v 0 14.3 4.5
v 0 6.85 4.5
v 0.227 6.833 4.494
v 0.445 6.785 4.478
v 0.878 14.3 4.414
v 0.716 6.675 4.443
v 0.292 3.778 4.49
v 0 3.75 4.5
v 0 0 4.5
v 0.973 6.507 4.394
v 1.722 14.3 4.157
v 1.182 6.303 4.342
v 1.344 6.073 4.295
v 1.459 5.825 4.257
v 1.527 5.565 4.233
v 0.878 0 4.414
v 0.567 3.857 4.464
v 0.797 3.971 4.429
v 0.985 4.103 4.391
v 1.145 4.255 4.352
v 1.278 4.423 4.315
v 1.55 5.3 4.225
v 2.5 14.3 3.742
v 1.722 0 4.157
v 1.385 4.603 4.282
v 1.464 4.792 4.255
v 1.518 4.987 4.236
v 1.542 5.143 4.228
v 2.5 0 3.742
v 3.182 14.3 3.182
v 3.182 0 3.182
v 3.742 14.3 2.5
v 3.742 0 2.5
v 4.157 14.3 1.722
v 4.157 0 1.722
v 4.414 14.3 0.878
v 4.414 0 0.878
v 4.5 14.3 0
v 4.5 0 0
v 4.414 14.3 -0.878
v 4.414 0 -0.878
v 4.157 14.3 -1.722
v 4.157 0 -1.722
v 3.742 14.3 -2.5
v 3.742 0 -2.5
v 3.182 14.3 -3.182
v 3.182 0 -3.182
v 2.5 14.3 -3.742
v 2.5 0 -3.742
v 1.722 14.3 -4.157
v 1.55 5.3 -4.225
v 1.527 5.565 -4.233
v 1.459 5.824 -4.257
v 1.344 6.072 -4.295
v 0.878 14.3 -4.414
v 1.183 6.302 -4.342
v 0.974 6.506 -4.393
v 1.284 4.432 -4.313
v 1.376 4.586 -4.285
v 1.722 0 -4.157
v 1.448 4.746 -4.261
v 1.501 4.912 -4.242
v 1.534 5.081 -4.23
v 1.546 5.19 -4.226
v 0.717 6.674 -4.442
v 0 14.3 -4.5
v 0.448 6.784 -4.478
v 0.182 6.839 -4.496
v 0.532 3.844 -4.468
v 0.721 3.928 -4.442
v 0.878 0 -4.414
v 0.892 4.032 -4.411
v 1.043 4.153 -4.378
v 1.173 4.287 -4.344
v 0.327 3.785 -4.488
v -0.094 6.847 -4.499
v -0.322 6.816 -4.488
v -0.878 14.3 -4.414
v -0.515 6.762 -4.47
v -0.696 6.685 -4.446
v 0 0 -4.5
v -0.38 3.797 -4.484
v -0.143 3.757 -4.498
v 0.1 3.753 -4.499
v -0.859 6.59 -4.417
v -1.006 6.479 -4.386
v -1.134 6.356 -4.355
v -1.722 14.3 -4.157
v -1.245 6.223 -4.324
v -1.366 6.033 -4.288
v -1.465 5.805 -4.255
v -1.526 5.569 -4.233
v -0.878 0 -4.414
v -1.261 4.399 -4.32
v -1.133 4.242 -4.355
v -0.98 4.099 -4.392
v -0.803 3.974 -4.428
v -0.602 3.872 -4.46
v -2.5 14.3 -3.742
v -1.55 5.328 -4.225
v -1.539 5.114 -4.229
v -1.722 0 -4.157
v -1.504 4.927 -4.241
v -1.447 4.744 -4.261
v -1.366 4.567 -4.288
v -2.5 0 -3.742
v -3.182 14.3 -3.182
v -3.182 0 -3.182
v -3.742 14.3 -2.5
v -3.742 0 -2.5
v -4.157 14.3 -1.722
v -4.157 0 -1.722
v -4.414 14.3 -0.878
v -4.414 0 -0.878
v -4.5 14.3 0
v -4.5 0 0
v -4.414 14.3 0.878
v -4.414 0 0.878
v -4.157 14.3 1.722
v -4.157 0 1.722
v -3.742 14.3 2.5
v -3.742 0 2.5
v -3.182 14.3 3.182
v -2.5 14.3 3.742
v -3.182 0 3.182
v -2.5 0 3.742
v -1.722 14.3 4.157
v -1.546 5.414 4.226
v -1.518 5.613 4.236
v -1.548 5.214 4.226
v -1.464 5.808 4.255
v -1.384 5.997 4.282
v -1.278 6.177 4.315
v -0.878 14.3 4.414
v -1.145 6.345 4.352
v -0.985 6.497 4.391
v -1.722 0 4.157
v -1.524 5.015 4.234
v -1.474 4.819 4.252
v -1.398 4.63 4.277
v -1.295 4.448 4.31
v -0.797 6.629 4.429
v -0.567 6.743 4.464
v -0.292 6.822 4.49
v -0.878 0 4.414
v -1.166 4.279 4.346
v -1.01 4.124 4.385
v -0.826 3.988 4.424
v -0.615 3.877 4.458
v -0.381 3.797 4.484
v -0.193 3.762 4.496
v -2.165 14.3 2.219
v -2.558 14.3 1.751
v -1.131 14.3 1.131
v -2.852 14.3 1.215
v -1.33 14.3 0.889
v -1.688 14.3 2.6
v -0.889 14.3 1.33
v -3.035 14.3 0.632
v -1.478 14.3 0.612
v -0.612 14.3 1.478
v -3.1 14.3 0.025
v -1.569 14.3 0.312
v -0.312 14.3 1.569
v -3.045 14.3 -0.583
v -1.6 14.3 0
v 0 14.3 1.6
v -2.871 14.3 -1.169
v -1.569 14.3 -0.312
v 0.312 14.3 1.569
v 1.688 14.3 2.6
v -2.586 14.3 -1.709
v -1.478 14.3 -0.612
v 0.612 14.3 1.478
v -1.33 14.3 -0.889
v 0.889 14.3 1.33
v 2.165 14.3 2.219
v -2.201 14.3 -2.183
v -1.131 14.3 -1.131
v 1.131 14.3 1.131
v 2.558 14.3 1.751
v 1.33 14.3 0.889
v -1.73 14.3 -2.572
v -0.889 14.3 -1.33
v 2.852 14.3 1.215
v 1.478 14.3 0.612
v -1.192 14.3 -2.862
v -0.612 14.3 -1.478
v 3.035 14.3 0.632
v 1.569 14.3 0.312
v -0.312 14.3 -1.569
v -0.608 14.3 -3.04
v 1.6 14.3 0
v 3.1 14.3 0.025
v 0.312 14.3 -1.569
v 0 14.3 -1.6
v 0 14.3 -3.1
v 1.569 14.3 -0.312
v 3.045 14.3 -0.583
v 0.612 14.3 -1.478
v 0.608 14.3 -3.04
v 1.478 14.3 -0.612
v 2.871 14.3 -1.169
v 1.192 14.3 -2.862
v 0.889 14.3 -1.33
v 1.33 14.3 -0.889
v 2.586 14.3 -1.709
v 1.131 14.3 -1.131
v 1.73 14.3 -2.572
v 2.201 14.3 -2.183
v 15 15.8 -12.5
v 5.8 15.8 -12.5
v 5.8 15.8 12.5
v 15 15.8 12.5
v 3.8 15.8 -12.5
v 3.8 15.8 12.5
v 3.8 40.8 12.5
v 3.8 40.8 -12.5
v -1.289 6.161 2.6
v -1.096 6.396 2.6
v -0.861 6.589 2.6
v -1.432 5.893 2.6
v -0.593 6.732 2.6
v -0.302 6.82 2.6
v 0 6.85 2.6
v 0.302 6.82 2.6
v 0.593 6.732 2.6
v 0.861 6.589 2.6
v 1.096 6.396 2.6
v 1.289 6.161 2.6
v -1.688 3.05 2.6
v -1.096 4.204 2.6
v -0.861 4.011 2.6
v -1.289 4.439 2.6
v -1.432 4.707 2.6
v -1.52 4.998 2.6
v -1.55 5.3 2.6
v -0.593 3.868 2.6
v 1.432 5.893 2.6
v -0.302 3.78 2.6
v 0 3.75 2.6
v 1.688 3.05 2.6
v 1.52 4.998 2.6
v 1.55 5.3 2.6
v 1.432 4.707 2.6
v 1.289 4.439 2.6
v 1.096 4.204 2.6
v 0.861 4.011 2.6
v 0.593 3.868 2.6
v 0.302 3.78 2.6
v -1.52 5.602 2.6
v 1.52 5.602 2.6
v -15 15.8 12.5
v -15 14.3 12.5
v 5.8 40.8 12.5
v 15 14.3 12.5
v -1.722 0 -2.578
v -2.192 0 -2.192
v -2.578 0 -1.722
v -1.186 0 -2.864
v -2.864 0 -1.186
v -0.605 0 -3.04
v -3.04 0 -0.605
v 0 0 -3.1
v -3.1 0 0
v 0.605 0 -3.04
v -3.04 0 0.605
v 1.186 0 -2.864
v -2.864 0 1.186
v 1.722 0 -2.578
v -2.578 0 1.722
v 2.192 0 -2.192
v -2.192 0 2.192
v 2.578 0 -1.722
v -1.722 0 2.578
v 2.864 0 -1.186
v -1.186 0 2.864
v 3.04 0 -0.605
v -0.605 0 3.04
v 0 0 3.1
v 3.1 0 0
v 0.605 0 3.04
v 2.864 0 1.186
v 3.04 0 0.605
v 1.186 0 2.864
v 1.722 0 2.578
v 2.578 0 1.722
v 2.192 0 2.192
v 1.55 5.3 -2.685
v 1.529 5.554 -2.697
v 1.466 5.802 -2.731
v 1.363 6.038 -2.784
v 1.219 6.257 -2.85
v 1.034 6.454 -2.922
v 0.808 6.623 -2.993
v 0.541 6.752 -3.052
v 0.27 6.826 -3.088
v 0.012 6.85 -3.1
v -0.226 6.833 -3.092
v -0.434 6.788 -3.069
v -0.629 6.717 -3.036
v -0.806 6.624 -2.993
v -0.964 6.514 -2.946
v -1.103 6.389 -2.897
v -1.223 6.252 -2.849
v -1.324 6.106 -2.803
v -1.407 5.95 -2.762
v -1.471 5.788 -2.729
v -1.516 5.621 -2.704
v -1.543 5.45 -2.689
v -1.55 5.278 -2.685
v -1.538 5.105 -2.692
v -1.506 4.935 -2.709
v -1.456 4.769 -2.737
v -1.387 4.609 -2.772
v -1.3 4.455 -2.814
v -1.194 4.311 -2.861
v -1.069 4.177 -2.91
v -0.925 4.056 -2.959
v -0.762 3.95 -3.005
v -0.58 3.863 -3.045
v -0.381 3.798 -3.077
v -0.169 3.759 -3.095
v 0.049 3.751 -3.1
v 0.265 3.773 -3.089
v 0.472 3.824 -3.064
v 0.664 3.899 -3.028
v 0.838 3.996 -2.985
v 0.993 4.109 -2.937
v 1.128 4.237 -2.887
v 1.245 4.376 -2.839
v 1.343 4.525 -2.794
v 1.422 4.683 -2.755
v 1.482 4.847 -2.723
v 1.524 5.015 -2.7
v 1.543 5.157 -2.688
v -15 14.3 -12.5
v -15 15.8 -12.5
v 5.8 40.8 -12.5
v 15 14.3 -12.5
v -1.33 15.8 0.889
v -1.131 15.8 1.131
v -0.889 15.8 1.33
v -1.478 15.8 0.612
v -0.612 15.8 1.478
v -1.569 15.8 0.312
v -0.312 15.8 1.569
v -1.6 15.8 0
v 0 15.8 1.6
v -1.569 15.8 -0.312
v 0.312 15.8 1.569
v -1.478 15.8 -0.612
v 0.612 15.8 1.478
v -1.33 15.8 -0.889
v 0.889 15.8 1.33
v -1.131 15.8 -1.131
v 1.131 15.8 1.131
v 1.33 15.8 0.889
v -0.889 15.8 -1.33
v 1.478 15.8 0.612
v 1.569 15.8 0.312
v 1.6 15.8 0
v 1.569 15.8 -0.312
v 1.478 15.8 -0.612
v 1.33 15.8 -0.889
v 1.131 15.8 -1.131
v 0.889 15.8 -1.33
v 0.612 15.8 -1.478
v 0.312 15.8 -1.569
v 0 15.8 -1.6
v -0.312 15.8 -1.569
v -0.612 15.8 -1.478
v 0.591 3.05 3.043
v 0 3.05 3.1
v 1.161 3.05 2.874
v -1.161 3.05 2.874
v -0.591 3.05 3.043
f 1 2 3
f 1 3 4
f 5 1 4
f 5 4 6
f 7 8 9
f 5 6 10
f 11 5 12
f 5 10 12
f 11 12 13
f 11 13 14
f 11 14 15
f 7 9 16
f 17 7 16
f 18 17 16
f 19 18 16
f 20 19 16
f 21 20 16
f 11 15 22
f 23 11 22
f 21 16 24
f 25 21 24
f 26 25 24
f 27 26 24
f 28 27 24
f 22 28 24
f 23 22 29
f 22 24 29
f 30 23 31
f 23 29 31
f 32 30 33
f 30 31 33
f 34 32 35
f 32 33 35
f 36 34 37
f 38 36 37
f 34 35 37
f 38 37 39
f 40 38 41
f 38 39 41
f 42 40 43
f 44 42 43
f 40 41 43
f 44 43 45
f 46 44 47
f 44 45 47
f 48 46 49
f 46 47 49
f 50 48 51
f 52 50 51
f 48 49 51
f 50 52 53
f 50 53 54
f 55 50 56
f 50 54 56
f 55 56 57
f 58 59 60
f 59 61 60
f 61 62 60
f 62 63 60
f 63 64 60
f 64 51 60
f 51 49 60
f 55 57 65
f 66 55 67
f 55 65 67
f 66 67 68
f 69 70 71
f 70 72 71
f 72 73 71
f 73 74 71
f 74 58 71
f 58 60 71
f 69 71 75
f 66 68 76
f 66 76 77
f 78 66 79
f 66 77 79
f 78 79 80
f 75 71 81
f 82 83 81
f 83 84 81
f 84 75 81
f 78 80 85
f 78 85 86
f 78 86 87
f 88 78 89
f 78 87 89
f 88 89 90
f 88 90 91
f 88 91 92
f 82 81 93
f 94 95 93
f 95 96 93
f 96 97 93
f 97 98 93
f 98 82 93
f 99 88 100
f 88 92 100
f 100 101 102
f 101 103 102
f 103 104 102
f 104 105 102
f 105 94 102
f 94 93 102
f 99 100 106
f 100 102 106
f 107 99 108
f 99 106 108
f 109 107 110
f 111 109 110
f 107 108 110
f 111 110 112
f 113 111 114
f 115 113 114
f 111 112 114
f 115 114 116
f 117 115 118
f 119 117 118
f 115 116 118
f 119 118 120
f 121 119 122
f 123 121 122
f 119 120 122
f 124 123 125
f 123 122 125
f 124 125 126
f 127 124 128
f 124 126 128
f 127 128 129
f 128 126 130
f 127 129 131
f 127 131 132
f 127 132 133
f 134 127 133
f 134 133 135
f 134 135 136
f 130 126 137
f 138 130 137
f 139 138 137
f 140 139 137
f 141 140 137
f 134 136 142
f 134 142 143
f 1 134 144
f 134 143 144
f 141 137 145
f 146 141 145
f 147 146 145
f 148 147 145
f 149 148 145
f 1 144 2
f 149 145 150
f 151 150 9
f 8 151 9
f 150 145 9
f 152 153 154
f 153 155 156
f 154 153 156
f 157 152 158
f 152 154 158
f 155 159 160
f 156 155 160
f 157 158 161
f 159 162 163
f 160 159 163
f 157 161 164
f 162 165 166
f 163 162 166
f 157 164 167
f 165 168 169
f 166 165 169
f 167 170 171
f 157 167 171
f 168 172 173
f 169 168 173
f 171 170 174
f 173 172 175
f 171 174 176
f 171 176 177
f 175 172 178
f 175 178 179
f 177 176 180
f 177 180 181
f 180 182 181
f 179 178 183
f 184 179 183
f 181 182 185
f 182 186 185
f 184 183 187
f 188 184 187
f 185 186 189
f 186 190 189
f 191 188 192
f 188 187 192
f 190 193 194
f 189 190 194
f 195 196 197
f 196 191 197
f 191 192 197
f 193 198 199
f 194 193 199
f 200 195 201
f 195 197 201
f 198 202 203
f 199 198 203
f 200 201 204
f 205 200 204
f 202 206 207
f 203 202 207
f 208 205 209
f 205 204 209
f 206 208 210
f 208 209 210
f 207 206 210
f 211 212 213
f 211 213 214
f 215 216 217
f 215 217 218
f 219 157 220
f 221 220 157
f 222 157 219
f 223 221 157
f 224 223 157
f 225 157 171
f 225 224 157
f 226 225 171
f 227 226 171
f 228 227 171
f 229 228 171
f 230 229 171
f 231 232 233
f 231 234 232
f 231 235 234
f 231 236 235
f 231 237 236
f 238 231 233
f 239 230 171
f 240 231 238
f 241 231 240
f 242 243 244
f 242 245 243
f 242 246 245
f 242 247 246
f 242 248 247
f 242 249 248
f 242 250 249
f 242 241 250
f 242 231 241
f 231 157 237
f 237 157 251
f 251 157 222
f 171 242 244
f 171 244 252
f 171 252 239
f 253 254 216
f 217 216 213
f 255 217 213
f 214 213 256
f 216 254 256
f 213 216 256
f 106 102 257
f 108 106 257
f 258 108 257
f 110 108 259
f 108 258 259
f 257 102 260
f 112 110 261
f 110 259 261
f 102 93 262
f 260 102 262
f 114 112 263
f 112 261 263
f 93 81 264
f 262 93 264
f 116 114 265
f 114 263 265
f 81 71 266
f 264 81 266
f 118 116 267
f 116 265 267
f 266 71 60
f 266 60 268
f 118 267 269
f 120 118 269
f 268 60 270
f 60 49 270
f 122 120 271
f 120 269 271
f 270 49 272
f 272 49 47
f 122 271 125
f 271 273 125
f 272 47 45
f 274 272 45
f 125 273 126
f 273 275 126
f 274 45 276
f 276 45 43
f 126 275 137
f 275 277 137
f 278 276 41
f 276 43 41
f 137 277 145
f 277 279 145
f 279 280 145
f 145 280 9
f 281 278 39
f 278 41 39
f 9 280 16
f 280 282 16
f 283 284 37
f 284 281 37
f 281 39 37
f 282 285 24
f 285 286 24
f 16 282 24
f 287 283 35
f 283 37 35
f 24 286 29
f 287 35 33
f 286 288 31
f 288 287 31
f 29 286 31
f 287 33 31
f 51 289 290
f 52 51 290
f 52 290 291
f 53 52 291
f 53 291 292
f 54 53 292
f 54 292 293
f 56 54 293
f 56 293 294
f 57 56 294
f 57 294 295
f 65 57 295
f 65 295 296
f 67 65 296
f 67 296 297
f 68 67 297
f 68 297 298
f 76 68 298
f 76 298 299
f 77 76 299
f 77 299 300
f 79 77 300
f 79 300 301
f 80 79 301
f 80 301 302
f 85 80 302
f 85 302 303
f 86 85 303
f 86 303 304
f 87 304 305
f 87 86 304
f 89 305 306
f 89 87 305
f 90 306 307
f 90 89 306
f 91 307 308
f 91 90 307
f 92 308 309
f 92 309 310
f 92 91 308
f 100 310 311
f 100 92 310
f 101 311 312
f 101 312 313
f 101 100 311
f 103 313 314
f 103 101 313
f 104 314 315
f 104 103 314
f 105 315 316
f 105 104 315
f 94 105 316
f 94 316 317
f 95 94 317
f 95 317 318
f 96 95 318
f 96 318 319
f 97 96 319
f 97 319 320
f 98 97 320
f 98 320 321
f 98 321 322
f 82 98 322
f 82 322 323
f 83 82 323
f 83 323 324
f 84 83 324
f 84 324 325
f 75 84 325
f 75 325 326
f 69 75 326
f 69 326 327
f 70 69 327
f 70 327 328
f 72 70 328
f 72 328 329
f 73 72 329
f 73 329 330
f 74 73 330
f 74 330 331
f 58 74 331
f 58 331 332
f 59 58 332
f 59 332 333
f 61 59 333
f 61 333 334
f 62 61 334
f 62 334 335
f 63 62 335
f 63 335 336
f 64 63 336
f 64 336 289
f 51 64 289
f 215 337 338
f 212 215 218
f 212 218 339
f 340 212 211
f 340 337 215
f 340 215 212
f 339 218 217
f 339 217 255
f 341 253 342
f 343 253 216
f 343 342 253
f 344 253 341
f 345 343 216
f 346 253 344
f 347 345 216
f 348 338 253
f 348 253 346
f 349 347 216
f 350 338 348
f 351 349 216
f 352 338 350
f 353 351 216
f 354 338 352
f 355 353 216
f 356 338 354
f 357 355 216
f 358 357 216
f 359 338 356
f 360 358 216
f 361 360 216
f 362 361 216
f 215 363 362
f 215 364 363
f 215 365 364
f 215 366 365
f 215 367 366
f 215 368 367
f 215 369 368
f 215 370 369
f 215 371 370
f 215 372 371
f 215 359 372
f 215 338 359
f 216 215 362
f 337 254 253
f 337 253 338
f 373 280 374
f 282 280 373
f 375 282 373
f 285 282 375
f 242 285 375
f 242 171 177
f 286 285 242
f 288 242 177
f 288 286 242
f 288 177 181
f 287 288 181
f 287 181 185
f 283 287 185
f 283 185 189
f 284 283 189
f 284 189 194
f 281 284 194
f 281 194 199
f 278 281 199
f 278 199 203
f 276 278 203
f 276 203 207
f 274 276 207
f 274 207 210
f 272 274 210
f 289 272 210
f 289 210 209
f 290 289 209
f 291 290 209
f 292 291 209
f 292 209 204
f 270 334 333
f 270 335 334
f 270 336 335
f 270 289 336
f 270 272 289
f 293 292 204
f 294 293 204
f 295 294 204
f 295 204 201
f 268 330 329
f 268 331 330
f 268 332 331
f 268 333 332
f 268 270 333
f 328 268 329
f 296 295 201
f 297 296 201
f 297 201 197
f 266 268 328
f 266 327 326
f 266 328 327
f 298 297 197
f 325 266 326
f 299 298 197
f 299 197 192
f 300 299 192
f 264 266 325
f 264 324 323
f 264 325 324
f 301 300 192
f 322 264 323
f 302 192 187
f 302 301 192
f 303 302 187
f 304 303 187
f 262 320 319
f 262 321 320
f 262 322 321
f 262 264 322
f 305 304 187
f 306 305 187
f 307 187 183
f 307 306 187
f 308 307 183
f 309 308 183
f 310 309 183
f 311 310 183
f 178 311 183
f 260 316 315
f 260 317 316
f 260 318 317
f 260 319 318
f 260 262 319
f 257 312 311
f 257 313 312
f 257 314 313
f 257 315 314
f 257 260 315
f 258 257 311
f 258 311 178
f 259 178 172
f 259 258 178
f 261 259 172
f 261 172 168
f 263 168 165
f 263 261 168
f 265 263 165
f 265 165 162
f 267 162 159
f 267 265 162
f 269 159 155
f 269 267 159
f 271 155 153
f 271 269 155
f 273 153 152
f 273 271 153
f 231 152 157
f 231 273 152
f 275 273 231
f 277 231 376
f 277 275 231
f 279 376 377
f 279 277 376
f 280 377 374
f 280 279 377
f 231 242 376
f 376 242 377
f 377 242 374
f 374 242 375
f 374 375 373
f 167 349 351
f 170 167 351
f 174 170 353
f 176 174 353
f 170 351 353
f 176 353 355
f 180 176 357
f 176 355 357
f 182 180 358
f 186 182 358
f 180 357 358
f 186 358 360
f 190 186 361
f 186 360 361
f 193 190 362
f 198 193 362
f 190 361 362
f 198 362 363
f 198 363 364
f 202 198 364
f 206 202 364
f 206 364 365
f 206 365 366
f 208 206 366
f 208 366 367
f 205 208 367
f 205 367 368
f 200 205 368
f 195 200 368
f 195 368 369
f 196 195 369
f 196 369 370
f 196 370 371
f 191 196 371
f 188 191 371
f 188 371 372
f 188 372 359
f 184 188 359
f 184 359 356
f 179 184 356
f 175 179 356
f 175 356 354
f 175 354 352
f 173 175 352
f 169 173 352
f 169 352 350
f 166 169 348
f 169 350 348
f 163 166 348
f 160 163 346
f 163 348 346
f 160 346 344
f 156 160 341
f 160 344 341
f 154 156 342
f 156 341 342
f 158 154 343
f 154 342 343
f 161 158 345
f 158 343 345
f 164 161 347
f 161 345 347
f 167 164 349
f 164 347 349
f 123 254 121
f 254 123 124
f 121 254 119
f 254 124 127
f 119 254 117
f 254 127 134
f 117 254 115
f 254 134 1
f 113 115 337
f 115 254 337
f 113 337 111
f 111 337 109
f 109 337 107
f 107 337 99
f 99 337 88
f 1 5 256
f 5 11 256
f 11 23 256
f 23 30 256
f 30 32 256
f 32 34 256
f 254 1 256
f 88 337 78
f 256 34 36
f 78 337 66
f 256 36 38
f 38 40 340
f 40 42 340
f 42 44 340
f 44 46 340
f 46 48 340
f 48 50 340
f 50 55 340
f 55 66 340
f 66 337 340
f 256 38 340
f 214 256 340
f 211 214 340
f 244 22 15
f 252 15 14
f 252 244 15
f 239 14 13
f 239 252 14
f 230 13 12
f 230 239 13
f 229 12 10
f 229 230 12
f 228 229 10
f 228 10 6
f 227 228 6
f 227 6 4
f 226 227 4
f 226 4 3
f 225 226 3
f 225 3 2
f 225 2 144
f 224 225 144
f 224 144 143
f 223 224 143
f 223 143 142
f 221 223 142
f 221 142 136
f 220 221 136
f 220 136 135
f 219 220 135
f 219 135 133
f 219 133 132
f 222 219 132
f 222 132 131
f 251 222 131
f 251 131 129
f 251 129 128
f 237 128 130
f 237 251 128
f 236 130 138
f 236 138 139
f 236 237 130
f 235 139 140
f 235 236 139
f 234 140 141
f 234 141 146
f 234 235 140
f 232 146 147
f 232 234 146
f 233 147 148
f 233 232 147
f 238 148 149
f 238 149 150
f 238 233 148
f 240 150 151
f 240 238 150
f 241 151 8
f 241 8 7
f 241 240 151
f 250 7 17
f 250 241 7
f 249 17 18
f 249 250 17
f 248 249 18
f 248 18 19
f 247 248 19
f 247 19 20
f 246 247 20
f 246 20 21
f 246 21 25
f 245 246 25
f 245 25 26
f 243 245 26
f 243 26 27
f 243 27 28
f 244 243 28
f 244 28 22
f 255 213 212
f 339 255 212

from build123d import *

# Parameters (mm, degrees)
SKETCH_1_R               = 4.5
SKETCH_1_R_2             = 3.1
EXTRUDE_1_DEPTH          = 14.3
EXTRUDE_START            = -11.25
EXTRUDE_2_DEPTH          = 11.25
CUT_EXTRUDE_1_DEPTH      = 16.652156401
CUT_EXTRUDE_1_DEPTH_BACK = 16.652156401
SKETCH_3_R               = 1.55
SKETCH_4_W               = 30
SKETCH_4_H               = 25
EXTRUDE_3_DEPTH          = 1.5
SKETCH_5_R               = 1.6
CUT_EXTRUDE_2_DEPTH      = 26.117523826
SKETCH_6_W               = 2
SKETCH_6_H               = 25
EXTRUDE_4_DEPTH          = 25


with BuildPart() as part:
    # 草图1 → 凸台-拉伸1 (new body)
    with BuildSketch(Plane(origin=(0, 0, 0), x_dir=(1, 0, 0), z_dir=(0, 1, 0))):
        with Locations(Location((0, 0, 0), (0, 0, 270))):
            Circle(SKETCH_1_R)
        with Locations(Location((0, 0, 0), (0, 0, 270))):
            Circle(SKETCH_1_R_2, mode=Mode.SUBTRACT)
    extrude(amount=EXTRUDE_1_DEPTH)

    # 草图2 → 凸台-拉伸2 (add)
    with BuildSketch(Plane(origin=(0, 14.3, 0), x_dir=(1, 0, 0), z_dir=(0, 1, 0)).offset(EXTRUDE_START)):
        with BuildLine():
            Line((-1.688194302, -2.6), (1.688194302, -2.6))
            ThreePointArc((1.688194302, -2.6), (0, -3.1), (-1.688194302, -2.6))
        make_face()
    extrude(amount=EXTRUDE_2_DEPTH)

    # 草图3 → 切除-拉伸1 (cut, two sides: drawn at the far end of the back side and taken through both)
    with BuildSketch(Plane.XY.offset(-CUT_EXTRUDE_1_DEPTH_BACK)):
        with Locations((0, 5.3)):
            Circle(SKETCH_3_R)
    extrude(amount=CUT_EXTRUDE_1_DEPTH + CUT_EXTRUDE_1_DEPTH_BACK, mode=Mode.SUBTRACT)

    # 草图4 → 凸台-拉伸3 (add)
    with BuildSketch(Plane(origin=(0, 14.3, 0), x_dir=(1, 0, 0), z_dir=(0, 1, 0))):
        Rectangle(SKETCH_4_W, SKETCH_4_H)
    extrude(amount=EXTRUDE_3_DEPTH)

    # 草图5 → 切除-拉伸2 (cut, through all)
    with BuildSketch(Plane(origin=(0, 15.8, 0), x_dir=(1, 0, 0), z_dir=(0, 1, 0))):
        with Locations(Location((0, 0, 0), (0, 0, 270))):
            Circle(SKETCH_5_R)
    extrude(amount=-CUT_EXTRUDE_2_DEPTH, mode=Mode.SUBTRACT)

    # 草图6 → 凸台-拉伸4 (add)
    with BuildSketch(Plane(origin=(0, 15.8, 0), x_dir=(1, 0, 0), z_dir=(0, 1, 0))):
        with Locations((4.8, 0)):
            Rectangle(SKETCH_6_W, SKETCH_6_H)
    extrude(amount=EXTRUDE_4_DEPTH)


solid = part.part
